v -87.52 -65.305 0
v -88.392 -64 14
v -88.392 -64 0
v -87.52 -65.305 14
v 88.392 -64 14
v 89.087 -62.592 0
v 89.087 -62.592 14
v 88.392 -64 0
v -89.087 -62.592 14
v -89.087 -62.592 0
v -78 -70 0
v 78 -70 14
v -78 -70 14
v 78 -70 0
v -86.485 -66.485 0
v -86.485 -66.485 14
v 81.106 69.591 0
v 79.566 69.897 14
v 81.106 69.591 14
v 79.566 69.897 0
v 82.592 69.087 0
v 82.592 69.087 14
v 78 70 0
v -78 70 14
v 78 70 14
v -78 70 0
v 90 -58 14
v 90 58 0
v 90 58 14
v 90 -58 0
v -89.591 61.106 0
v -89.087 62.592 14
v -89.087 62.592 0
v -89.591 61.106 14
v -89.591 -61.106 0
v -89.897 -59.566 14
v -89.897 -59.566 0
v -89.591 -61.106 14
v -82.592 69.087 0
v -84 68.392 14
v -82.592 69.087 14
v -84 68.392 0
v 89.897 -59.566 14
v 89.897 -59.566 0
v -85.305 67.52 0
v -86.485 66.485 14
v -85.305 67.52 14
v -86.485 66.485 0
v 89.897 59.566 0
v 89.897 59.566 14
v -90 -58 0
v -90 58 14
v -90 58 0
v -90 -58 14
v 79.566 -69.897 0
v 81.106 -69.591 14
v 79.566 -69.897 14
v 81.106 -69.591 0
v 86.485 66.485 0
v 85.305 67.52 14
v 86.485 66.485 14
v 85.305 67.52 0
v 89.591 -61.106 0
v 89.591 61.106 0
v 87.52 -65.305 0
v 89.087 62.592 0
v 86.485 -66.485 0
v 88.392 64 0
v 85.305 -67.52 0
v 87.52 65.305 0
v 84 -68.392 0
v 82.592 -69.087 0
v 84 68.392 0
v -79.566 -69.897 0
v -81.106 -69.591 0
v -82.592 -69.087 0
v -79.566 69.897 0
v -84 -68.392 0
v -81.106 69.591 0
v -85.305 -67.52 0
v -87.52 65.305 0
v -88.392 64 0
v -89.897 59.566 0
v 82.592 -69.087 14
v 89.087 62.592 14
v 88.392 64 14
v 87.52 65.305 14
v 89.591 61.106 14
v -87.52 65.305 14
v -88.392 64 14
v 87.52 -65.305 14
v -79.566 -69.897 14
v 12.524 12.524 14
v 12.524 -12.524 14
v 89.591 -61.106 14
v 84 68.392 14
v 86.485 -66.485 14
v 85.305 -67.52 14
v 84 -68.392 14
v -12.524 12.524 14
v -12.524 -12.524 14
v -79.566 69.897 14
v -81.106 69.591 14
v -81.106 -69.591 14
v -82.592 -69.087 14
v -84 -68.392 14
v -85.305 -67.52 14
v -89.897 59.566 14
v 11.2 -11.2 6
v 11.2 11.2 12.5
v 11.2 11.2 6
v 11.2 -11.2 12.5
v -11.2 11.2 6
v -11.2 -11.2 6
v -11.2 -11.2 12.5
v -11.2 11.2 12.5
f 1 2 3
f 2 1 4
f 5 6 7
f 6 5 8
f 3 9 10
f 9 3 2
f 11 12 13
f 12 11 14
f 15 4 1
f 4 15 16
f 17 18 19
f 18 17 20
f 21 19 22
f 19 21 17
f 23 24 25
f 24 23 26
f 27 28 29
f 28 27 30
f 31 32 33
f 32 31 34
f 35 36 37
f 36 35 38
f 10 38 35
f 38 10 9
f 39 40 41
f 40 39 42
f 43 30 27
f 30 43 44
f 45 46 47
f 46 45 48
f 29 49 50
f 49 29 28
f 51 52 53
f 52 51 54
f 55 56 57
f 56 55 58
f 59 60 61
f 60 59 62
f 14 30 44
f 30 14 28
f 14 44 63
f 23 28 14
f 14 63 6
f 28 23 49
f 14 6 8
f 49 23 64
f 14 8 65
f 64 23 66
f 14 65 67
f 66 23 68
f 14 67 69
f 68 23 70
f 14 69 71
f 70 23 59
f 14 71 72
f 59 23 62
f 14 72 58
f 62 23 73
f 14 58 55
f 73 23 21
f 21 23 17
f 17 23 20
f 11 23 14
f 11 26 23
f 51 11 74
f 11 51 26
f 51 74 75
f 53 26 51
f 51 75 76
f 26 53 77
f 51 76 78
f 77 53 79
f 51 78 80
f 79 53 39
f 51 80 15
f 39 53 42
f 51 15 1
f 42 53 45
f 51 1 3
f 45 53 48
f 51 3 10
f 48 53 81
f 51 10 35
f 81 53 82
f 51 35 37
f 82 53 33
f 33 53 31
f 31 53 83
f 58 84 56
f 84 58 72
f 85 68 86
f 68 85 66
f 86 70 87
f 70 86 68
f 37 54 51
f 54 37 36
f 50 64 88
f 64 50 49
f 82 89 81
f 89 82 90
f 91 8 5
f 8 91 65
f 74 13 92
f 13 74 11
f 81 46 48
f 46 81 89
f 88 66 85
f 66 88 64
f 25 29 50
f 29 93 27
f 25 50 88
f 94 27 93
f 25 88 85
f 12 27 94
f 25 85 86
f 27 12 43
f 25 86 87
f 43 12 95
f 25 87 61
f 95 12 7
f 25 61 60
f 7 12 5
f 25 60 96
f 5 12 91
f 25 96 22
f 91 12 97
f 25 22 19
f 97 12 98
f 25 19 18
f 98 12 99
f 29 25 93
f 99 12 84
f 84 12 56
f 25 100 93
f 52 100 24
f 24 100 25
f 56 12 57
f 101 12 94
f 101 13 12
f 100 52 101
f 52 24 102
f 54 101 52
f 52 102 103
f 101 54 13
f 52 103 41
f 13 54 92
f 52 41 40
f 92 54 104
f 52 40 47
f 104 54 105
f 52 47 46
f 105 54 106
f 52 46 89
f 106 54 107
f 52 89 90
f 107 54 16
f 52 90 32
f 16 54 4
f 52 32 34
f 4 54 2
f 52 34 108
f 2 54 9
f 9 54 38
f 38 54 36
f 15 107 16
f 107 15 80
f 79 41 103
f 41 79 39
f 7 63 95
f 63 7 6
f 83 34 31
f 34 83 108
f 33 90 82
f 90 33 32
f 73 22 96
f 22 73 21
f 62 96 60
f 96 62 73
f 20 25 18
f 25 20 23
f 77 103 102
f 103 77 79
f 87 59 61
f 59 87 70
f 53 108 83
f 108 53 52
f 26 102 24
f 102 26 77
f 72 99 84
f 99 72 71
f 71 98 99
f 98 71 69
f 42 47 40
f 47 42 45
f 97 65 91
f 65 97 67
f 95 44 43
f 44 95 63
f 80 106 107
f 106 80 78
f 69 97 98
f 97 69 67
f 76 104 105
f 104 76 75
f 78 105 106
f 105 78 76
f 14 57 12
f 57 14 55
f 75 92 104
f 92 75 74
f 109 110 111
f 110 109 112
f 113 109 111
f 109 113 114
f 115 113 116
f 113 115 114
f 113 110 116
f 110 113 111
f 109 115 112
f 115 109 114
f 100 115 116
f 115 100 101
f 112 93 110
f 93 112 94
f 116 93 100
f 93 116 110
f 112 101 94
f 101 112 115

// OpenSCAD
/* Headphone stand in three parts: base, post, hanger.
   Print orientation: base flat, post tenon-down, hanger upside-down.
   Joints: square slip fit 22/22.4 (base-post) and 18/18.4 (post-hanger),
   0.2 mm/side clearance, square section locks rotation. */

part = "base"; // [base,post,hanger,assembly]

cadverify_only = "";
module instance(name, part, unit = 1) {
    echo(cadverify_instance = [name, part, unit]);
    if (cadverify_only == "" || cadverify_only == name) children();
}

// ---------- parameters (mm) ----------
base_L = 180; base_W = 140; base_H = 14; base_corner_r = 12;
base_sock_S = 22.4; base_sock_straight_top = 12.5; base_sock_floor = 6;
base_flare_top_S = 25.4;

post_bot_tenon_S = 22; post_bot_tenon_H = 8;
post_cone_H = 4; post_body_bot_S = 30; post_body_top_S = 24; post_body_H = 224;
post_top_tenon_S = 18; post_top_tenon_H = 8;

hanger_L = 110; hanger_W = 44; hanger_slab_H = 6; hanger_ridge_R = 22;
hanger_ridge_L = 90; hanger_sock_S = 18.4; hanger_sock_H = 8.1;
hanger_roof_base = 7.9; hanger_roof_H = 9.2;

post_Z = 6;
hanger_Z = 242; // post shoulder (236+6) -> hanger top 242+28 = 270

// ---------- modules (print orientation, min z = 0) ----------
module base() {
    difference() {
        linear_extrude(height = base_H)
            hull() {
                for (sx = [-1, 1], sy = [-1, 1])
                    translate([sx*(base_L/2-base_corner_r), sy*(base_W/2-base_corner_r)])
                        circle(r = base_corner_r, $fn = 48);
            }
        // straight socket
        translate([-base_sock_S/2, -base_sock_S/2, base_sock_floor])
            cube([base_sock_S, base_sock_S, base_H - base_sock_floor + 0.2]);
        // 45 deg entry flare
        translate([0, 0, base_sock_straight_top])
            linear_extrude(height = base_H - base_sock_straight_top + 0.2,
                           scale = base_flare_top_S/base_sock_S)
                square([base_sock_S, base_sock_S], center = true);
    }
}

module post() {
    // bottom tenon
    translate([-post_bot_tenon_S/2, -post_bot_tenon_S/2, 0])
        cube([post_bot_tenon_S, post_bot_tenon_S, post_bot_tenon_H]);
    // 45 deg collar cone 22 -> 30
    translate([0, 0, post_bot_tenon_H])
        linear_extrude(height = post_cone_H, scale = post_body_bot_S/post_bot_tenon_S)
            square([post_bot_tenon_S, post_bot_tenon_S], center = true);
    // tapered body 30 -> 24
    translate([0, 0, post_bot_tenon_H + post_cone_H])
        linear_extrude(height = post_body_H, scale = post_body_top_S/post_body_bot_S)
            square([post_body_bot_S, post_body_bot_S], center = true);
    // top tenon
    translate([-post_top_tenon_S/2, -post_top_tenon_S/2,
               post_bot_tenon_H + post_cone_H + post_body_H])
        cube([post_top_tenon_S, post_top_tenon_S, post_top_tenon_H]);
}

module hanger() {
    difference() {
        union() {
            // bottom slab with rounded plan corners
            linear_extrude(height = hanger_slab_H)
                hull() {
                    for (sx = [-1, 1], sy = [-1, 1])
                        translate([sx*(hanger_L/2-6), sy*(hanger_W/2-6)])
                            circle(r = 6, $fn = 32);
                }
            // rounded crown: top half of a horizontal cylinder along X
            intersection() {
                translate([0, 0, hanger_slab_H])
                    rotate([0, 90, 0])
                        cylinder(r = hanger_ridge_R, h = hanger_ridge_L,
                                 center = true, $fn = 128);
                translate([-hanger_ridge_L/2, -hanger_W/2, hanger_slab_H - 0.1])
                    cube([hanger_ridge_L, hanger_W, hanger_ridge_R + 0.1]);
            }
        }
        // straight socket from the bed face
        translate([-hanger_sock_S/2, -hanger_sock_S/2, -0.1])
            cube([hanger_sock_S, hanger_sock_S, hanger_sock_H + 0.2]);
        // 45 deg pyramid roof inside (no flat ceiling -> no supports)
        translate([0, 0, hanger_roof_base])
            linear_extrude(height = hanger_roof_H, scale = 0)
                square([hanger_sock_S, hanger_sock_S], center = true);
    }
}

module assembly() {
    instance("base_1", "base") translate([0, 0, 0]) base();
    instance("post_1", "post") translate([0, 0, post_Z]) post();
    instance("hanger_1", "hanger") translate([0, 0, hanger_Z]) hanger();
}

// ---------- spec ----------
if (part == "base") {
    echo(cadverify_spec = [
        ["bounds", [[-90, -70, 0], [90, 70, 14]]],
        ["bodies", 1],
        ["through_holes", 0],
        ["support_faces", [["base_bottom", "-z", 20000]]],
        ["overhangs_allowed", []],
        ["copies", 1],
        ["details", [
            ["base_plate", "material", [[-90, -70, 0], [90, 70, 6]], 0.9],
            ["socket_void", "void", [[-11.2, -11.2, 6], [11.2, 11.2, 12.5]], 0.9],
            ["mouth_flare", "hole", [0, 0, 20], [0, 0, -1], [[0, 28.2], [1.5, 25.3]]],
            ["floor", "thickness", [0, 0, -5], [0, 0, 1], 6]
        ]]
    ]);
} else if (part == "post") {
    echo(cadverify_spec = [
        ["bounds", [[-15, -15, 0], [15, 15, 244]]],
        ["bodies", 1],
        ["through_holes", 0],
        ["support_faces", [["tenon_bottom", "-z", 400]]],
        ["overhangs_allowed", []],
        ["copies", 1],
        ["details", [
            ["bottom_tenon", "material", [[-11, -11, 0], [11, 11, 8]], 0.9],
            ["collar", "material", [[-10, -10, 8], [10, 10, 12]], 0.9],
            ["body_inner", "material", [[-11, -11, 30], [11, 11, 100]], 0.9],
            ["top_tenon", "material", [[-9, -9, 236], [9, 9, 244]], 0.9],
            ["side_wall", "thickness", [-30, 0, 100], [1, 0, 0], 27.6]
        ]]
    ]);
} else if (part == "hanger") {
    echo(cadverify_spec = [
        ["bounds", [[-55, -22, 0], [55, 22, 28]]],
        ["bodies", 1],
        ["through_holes", 0],
        ["support_faces", [["hanger_bottom", "-z", 3500]]],
        ["overhangs_allowed", []],
        ["copies", 1],
        ["details", [
            ["wing_solid", "material", [[25, -20, 0], [50, 20, 6]], 0.9],
            ["ridge_solid", "material", [[25, -6, 10], [40, 6, 20]], 0.9],
            ["socket_void", "void", [[-9.2, -9.2, 0], [9.2, 9.2, 8]], 0.9],
            ["roof_void", "void", [[-9.2, -9.2, 8], [9.2, 9.2, 17.1]], 0.3],
            ["socket_entry", "hole", [0, 0, -5], [0, 0, 1], [[0, 20.8], [8, 20.8]]],
            ["crown_width", "thickness", [0, -30, 20], [0, 1, 0], 33.9],
            ["crown_floor", "thickness", [0, 0, 35], [0, 0, -1], 10.9],
            ["crown_round", "view", [[-20, -22, 20], [20, 22, 28]]]
        ]]
    ]);
} else if (part == "assembly") {
    echo(cadverify_spec = [
        ["bounds", [[-90, -70, 0], [90, 70, 270]]],
        ["support_faces", [["desk", "-z", 20000]]],
        ["allowed_interferences", []],
        ["motions", []],
        ["assembly_order", [
            [["base_1"], [0, 0, 0]],
            [["post_1"], [0, 0, -1]],
            [["hanger_1"], [0, 0, -1]]
        ]]
    ]);
}

// ---------- output ----------
if (part == "base") base();
else if (part == "post") post();
else if (part == "hanger") hanger();
else if (part == "assembly") assembly();
